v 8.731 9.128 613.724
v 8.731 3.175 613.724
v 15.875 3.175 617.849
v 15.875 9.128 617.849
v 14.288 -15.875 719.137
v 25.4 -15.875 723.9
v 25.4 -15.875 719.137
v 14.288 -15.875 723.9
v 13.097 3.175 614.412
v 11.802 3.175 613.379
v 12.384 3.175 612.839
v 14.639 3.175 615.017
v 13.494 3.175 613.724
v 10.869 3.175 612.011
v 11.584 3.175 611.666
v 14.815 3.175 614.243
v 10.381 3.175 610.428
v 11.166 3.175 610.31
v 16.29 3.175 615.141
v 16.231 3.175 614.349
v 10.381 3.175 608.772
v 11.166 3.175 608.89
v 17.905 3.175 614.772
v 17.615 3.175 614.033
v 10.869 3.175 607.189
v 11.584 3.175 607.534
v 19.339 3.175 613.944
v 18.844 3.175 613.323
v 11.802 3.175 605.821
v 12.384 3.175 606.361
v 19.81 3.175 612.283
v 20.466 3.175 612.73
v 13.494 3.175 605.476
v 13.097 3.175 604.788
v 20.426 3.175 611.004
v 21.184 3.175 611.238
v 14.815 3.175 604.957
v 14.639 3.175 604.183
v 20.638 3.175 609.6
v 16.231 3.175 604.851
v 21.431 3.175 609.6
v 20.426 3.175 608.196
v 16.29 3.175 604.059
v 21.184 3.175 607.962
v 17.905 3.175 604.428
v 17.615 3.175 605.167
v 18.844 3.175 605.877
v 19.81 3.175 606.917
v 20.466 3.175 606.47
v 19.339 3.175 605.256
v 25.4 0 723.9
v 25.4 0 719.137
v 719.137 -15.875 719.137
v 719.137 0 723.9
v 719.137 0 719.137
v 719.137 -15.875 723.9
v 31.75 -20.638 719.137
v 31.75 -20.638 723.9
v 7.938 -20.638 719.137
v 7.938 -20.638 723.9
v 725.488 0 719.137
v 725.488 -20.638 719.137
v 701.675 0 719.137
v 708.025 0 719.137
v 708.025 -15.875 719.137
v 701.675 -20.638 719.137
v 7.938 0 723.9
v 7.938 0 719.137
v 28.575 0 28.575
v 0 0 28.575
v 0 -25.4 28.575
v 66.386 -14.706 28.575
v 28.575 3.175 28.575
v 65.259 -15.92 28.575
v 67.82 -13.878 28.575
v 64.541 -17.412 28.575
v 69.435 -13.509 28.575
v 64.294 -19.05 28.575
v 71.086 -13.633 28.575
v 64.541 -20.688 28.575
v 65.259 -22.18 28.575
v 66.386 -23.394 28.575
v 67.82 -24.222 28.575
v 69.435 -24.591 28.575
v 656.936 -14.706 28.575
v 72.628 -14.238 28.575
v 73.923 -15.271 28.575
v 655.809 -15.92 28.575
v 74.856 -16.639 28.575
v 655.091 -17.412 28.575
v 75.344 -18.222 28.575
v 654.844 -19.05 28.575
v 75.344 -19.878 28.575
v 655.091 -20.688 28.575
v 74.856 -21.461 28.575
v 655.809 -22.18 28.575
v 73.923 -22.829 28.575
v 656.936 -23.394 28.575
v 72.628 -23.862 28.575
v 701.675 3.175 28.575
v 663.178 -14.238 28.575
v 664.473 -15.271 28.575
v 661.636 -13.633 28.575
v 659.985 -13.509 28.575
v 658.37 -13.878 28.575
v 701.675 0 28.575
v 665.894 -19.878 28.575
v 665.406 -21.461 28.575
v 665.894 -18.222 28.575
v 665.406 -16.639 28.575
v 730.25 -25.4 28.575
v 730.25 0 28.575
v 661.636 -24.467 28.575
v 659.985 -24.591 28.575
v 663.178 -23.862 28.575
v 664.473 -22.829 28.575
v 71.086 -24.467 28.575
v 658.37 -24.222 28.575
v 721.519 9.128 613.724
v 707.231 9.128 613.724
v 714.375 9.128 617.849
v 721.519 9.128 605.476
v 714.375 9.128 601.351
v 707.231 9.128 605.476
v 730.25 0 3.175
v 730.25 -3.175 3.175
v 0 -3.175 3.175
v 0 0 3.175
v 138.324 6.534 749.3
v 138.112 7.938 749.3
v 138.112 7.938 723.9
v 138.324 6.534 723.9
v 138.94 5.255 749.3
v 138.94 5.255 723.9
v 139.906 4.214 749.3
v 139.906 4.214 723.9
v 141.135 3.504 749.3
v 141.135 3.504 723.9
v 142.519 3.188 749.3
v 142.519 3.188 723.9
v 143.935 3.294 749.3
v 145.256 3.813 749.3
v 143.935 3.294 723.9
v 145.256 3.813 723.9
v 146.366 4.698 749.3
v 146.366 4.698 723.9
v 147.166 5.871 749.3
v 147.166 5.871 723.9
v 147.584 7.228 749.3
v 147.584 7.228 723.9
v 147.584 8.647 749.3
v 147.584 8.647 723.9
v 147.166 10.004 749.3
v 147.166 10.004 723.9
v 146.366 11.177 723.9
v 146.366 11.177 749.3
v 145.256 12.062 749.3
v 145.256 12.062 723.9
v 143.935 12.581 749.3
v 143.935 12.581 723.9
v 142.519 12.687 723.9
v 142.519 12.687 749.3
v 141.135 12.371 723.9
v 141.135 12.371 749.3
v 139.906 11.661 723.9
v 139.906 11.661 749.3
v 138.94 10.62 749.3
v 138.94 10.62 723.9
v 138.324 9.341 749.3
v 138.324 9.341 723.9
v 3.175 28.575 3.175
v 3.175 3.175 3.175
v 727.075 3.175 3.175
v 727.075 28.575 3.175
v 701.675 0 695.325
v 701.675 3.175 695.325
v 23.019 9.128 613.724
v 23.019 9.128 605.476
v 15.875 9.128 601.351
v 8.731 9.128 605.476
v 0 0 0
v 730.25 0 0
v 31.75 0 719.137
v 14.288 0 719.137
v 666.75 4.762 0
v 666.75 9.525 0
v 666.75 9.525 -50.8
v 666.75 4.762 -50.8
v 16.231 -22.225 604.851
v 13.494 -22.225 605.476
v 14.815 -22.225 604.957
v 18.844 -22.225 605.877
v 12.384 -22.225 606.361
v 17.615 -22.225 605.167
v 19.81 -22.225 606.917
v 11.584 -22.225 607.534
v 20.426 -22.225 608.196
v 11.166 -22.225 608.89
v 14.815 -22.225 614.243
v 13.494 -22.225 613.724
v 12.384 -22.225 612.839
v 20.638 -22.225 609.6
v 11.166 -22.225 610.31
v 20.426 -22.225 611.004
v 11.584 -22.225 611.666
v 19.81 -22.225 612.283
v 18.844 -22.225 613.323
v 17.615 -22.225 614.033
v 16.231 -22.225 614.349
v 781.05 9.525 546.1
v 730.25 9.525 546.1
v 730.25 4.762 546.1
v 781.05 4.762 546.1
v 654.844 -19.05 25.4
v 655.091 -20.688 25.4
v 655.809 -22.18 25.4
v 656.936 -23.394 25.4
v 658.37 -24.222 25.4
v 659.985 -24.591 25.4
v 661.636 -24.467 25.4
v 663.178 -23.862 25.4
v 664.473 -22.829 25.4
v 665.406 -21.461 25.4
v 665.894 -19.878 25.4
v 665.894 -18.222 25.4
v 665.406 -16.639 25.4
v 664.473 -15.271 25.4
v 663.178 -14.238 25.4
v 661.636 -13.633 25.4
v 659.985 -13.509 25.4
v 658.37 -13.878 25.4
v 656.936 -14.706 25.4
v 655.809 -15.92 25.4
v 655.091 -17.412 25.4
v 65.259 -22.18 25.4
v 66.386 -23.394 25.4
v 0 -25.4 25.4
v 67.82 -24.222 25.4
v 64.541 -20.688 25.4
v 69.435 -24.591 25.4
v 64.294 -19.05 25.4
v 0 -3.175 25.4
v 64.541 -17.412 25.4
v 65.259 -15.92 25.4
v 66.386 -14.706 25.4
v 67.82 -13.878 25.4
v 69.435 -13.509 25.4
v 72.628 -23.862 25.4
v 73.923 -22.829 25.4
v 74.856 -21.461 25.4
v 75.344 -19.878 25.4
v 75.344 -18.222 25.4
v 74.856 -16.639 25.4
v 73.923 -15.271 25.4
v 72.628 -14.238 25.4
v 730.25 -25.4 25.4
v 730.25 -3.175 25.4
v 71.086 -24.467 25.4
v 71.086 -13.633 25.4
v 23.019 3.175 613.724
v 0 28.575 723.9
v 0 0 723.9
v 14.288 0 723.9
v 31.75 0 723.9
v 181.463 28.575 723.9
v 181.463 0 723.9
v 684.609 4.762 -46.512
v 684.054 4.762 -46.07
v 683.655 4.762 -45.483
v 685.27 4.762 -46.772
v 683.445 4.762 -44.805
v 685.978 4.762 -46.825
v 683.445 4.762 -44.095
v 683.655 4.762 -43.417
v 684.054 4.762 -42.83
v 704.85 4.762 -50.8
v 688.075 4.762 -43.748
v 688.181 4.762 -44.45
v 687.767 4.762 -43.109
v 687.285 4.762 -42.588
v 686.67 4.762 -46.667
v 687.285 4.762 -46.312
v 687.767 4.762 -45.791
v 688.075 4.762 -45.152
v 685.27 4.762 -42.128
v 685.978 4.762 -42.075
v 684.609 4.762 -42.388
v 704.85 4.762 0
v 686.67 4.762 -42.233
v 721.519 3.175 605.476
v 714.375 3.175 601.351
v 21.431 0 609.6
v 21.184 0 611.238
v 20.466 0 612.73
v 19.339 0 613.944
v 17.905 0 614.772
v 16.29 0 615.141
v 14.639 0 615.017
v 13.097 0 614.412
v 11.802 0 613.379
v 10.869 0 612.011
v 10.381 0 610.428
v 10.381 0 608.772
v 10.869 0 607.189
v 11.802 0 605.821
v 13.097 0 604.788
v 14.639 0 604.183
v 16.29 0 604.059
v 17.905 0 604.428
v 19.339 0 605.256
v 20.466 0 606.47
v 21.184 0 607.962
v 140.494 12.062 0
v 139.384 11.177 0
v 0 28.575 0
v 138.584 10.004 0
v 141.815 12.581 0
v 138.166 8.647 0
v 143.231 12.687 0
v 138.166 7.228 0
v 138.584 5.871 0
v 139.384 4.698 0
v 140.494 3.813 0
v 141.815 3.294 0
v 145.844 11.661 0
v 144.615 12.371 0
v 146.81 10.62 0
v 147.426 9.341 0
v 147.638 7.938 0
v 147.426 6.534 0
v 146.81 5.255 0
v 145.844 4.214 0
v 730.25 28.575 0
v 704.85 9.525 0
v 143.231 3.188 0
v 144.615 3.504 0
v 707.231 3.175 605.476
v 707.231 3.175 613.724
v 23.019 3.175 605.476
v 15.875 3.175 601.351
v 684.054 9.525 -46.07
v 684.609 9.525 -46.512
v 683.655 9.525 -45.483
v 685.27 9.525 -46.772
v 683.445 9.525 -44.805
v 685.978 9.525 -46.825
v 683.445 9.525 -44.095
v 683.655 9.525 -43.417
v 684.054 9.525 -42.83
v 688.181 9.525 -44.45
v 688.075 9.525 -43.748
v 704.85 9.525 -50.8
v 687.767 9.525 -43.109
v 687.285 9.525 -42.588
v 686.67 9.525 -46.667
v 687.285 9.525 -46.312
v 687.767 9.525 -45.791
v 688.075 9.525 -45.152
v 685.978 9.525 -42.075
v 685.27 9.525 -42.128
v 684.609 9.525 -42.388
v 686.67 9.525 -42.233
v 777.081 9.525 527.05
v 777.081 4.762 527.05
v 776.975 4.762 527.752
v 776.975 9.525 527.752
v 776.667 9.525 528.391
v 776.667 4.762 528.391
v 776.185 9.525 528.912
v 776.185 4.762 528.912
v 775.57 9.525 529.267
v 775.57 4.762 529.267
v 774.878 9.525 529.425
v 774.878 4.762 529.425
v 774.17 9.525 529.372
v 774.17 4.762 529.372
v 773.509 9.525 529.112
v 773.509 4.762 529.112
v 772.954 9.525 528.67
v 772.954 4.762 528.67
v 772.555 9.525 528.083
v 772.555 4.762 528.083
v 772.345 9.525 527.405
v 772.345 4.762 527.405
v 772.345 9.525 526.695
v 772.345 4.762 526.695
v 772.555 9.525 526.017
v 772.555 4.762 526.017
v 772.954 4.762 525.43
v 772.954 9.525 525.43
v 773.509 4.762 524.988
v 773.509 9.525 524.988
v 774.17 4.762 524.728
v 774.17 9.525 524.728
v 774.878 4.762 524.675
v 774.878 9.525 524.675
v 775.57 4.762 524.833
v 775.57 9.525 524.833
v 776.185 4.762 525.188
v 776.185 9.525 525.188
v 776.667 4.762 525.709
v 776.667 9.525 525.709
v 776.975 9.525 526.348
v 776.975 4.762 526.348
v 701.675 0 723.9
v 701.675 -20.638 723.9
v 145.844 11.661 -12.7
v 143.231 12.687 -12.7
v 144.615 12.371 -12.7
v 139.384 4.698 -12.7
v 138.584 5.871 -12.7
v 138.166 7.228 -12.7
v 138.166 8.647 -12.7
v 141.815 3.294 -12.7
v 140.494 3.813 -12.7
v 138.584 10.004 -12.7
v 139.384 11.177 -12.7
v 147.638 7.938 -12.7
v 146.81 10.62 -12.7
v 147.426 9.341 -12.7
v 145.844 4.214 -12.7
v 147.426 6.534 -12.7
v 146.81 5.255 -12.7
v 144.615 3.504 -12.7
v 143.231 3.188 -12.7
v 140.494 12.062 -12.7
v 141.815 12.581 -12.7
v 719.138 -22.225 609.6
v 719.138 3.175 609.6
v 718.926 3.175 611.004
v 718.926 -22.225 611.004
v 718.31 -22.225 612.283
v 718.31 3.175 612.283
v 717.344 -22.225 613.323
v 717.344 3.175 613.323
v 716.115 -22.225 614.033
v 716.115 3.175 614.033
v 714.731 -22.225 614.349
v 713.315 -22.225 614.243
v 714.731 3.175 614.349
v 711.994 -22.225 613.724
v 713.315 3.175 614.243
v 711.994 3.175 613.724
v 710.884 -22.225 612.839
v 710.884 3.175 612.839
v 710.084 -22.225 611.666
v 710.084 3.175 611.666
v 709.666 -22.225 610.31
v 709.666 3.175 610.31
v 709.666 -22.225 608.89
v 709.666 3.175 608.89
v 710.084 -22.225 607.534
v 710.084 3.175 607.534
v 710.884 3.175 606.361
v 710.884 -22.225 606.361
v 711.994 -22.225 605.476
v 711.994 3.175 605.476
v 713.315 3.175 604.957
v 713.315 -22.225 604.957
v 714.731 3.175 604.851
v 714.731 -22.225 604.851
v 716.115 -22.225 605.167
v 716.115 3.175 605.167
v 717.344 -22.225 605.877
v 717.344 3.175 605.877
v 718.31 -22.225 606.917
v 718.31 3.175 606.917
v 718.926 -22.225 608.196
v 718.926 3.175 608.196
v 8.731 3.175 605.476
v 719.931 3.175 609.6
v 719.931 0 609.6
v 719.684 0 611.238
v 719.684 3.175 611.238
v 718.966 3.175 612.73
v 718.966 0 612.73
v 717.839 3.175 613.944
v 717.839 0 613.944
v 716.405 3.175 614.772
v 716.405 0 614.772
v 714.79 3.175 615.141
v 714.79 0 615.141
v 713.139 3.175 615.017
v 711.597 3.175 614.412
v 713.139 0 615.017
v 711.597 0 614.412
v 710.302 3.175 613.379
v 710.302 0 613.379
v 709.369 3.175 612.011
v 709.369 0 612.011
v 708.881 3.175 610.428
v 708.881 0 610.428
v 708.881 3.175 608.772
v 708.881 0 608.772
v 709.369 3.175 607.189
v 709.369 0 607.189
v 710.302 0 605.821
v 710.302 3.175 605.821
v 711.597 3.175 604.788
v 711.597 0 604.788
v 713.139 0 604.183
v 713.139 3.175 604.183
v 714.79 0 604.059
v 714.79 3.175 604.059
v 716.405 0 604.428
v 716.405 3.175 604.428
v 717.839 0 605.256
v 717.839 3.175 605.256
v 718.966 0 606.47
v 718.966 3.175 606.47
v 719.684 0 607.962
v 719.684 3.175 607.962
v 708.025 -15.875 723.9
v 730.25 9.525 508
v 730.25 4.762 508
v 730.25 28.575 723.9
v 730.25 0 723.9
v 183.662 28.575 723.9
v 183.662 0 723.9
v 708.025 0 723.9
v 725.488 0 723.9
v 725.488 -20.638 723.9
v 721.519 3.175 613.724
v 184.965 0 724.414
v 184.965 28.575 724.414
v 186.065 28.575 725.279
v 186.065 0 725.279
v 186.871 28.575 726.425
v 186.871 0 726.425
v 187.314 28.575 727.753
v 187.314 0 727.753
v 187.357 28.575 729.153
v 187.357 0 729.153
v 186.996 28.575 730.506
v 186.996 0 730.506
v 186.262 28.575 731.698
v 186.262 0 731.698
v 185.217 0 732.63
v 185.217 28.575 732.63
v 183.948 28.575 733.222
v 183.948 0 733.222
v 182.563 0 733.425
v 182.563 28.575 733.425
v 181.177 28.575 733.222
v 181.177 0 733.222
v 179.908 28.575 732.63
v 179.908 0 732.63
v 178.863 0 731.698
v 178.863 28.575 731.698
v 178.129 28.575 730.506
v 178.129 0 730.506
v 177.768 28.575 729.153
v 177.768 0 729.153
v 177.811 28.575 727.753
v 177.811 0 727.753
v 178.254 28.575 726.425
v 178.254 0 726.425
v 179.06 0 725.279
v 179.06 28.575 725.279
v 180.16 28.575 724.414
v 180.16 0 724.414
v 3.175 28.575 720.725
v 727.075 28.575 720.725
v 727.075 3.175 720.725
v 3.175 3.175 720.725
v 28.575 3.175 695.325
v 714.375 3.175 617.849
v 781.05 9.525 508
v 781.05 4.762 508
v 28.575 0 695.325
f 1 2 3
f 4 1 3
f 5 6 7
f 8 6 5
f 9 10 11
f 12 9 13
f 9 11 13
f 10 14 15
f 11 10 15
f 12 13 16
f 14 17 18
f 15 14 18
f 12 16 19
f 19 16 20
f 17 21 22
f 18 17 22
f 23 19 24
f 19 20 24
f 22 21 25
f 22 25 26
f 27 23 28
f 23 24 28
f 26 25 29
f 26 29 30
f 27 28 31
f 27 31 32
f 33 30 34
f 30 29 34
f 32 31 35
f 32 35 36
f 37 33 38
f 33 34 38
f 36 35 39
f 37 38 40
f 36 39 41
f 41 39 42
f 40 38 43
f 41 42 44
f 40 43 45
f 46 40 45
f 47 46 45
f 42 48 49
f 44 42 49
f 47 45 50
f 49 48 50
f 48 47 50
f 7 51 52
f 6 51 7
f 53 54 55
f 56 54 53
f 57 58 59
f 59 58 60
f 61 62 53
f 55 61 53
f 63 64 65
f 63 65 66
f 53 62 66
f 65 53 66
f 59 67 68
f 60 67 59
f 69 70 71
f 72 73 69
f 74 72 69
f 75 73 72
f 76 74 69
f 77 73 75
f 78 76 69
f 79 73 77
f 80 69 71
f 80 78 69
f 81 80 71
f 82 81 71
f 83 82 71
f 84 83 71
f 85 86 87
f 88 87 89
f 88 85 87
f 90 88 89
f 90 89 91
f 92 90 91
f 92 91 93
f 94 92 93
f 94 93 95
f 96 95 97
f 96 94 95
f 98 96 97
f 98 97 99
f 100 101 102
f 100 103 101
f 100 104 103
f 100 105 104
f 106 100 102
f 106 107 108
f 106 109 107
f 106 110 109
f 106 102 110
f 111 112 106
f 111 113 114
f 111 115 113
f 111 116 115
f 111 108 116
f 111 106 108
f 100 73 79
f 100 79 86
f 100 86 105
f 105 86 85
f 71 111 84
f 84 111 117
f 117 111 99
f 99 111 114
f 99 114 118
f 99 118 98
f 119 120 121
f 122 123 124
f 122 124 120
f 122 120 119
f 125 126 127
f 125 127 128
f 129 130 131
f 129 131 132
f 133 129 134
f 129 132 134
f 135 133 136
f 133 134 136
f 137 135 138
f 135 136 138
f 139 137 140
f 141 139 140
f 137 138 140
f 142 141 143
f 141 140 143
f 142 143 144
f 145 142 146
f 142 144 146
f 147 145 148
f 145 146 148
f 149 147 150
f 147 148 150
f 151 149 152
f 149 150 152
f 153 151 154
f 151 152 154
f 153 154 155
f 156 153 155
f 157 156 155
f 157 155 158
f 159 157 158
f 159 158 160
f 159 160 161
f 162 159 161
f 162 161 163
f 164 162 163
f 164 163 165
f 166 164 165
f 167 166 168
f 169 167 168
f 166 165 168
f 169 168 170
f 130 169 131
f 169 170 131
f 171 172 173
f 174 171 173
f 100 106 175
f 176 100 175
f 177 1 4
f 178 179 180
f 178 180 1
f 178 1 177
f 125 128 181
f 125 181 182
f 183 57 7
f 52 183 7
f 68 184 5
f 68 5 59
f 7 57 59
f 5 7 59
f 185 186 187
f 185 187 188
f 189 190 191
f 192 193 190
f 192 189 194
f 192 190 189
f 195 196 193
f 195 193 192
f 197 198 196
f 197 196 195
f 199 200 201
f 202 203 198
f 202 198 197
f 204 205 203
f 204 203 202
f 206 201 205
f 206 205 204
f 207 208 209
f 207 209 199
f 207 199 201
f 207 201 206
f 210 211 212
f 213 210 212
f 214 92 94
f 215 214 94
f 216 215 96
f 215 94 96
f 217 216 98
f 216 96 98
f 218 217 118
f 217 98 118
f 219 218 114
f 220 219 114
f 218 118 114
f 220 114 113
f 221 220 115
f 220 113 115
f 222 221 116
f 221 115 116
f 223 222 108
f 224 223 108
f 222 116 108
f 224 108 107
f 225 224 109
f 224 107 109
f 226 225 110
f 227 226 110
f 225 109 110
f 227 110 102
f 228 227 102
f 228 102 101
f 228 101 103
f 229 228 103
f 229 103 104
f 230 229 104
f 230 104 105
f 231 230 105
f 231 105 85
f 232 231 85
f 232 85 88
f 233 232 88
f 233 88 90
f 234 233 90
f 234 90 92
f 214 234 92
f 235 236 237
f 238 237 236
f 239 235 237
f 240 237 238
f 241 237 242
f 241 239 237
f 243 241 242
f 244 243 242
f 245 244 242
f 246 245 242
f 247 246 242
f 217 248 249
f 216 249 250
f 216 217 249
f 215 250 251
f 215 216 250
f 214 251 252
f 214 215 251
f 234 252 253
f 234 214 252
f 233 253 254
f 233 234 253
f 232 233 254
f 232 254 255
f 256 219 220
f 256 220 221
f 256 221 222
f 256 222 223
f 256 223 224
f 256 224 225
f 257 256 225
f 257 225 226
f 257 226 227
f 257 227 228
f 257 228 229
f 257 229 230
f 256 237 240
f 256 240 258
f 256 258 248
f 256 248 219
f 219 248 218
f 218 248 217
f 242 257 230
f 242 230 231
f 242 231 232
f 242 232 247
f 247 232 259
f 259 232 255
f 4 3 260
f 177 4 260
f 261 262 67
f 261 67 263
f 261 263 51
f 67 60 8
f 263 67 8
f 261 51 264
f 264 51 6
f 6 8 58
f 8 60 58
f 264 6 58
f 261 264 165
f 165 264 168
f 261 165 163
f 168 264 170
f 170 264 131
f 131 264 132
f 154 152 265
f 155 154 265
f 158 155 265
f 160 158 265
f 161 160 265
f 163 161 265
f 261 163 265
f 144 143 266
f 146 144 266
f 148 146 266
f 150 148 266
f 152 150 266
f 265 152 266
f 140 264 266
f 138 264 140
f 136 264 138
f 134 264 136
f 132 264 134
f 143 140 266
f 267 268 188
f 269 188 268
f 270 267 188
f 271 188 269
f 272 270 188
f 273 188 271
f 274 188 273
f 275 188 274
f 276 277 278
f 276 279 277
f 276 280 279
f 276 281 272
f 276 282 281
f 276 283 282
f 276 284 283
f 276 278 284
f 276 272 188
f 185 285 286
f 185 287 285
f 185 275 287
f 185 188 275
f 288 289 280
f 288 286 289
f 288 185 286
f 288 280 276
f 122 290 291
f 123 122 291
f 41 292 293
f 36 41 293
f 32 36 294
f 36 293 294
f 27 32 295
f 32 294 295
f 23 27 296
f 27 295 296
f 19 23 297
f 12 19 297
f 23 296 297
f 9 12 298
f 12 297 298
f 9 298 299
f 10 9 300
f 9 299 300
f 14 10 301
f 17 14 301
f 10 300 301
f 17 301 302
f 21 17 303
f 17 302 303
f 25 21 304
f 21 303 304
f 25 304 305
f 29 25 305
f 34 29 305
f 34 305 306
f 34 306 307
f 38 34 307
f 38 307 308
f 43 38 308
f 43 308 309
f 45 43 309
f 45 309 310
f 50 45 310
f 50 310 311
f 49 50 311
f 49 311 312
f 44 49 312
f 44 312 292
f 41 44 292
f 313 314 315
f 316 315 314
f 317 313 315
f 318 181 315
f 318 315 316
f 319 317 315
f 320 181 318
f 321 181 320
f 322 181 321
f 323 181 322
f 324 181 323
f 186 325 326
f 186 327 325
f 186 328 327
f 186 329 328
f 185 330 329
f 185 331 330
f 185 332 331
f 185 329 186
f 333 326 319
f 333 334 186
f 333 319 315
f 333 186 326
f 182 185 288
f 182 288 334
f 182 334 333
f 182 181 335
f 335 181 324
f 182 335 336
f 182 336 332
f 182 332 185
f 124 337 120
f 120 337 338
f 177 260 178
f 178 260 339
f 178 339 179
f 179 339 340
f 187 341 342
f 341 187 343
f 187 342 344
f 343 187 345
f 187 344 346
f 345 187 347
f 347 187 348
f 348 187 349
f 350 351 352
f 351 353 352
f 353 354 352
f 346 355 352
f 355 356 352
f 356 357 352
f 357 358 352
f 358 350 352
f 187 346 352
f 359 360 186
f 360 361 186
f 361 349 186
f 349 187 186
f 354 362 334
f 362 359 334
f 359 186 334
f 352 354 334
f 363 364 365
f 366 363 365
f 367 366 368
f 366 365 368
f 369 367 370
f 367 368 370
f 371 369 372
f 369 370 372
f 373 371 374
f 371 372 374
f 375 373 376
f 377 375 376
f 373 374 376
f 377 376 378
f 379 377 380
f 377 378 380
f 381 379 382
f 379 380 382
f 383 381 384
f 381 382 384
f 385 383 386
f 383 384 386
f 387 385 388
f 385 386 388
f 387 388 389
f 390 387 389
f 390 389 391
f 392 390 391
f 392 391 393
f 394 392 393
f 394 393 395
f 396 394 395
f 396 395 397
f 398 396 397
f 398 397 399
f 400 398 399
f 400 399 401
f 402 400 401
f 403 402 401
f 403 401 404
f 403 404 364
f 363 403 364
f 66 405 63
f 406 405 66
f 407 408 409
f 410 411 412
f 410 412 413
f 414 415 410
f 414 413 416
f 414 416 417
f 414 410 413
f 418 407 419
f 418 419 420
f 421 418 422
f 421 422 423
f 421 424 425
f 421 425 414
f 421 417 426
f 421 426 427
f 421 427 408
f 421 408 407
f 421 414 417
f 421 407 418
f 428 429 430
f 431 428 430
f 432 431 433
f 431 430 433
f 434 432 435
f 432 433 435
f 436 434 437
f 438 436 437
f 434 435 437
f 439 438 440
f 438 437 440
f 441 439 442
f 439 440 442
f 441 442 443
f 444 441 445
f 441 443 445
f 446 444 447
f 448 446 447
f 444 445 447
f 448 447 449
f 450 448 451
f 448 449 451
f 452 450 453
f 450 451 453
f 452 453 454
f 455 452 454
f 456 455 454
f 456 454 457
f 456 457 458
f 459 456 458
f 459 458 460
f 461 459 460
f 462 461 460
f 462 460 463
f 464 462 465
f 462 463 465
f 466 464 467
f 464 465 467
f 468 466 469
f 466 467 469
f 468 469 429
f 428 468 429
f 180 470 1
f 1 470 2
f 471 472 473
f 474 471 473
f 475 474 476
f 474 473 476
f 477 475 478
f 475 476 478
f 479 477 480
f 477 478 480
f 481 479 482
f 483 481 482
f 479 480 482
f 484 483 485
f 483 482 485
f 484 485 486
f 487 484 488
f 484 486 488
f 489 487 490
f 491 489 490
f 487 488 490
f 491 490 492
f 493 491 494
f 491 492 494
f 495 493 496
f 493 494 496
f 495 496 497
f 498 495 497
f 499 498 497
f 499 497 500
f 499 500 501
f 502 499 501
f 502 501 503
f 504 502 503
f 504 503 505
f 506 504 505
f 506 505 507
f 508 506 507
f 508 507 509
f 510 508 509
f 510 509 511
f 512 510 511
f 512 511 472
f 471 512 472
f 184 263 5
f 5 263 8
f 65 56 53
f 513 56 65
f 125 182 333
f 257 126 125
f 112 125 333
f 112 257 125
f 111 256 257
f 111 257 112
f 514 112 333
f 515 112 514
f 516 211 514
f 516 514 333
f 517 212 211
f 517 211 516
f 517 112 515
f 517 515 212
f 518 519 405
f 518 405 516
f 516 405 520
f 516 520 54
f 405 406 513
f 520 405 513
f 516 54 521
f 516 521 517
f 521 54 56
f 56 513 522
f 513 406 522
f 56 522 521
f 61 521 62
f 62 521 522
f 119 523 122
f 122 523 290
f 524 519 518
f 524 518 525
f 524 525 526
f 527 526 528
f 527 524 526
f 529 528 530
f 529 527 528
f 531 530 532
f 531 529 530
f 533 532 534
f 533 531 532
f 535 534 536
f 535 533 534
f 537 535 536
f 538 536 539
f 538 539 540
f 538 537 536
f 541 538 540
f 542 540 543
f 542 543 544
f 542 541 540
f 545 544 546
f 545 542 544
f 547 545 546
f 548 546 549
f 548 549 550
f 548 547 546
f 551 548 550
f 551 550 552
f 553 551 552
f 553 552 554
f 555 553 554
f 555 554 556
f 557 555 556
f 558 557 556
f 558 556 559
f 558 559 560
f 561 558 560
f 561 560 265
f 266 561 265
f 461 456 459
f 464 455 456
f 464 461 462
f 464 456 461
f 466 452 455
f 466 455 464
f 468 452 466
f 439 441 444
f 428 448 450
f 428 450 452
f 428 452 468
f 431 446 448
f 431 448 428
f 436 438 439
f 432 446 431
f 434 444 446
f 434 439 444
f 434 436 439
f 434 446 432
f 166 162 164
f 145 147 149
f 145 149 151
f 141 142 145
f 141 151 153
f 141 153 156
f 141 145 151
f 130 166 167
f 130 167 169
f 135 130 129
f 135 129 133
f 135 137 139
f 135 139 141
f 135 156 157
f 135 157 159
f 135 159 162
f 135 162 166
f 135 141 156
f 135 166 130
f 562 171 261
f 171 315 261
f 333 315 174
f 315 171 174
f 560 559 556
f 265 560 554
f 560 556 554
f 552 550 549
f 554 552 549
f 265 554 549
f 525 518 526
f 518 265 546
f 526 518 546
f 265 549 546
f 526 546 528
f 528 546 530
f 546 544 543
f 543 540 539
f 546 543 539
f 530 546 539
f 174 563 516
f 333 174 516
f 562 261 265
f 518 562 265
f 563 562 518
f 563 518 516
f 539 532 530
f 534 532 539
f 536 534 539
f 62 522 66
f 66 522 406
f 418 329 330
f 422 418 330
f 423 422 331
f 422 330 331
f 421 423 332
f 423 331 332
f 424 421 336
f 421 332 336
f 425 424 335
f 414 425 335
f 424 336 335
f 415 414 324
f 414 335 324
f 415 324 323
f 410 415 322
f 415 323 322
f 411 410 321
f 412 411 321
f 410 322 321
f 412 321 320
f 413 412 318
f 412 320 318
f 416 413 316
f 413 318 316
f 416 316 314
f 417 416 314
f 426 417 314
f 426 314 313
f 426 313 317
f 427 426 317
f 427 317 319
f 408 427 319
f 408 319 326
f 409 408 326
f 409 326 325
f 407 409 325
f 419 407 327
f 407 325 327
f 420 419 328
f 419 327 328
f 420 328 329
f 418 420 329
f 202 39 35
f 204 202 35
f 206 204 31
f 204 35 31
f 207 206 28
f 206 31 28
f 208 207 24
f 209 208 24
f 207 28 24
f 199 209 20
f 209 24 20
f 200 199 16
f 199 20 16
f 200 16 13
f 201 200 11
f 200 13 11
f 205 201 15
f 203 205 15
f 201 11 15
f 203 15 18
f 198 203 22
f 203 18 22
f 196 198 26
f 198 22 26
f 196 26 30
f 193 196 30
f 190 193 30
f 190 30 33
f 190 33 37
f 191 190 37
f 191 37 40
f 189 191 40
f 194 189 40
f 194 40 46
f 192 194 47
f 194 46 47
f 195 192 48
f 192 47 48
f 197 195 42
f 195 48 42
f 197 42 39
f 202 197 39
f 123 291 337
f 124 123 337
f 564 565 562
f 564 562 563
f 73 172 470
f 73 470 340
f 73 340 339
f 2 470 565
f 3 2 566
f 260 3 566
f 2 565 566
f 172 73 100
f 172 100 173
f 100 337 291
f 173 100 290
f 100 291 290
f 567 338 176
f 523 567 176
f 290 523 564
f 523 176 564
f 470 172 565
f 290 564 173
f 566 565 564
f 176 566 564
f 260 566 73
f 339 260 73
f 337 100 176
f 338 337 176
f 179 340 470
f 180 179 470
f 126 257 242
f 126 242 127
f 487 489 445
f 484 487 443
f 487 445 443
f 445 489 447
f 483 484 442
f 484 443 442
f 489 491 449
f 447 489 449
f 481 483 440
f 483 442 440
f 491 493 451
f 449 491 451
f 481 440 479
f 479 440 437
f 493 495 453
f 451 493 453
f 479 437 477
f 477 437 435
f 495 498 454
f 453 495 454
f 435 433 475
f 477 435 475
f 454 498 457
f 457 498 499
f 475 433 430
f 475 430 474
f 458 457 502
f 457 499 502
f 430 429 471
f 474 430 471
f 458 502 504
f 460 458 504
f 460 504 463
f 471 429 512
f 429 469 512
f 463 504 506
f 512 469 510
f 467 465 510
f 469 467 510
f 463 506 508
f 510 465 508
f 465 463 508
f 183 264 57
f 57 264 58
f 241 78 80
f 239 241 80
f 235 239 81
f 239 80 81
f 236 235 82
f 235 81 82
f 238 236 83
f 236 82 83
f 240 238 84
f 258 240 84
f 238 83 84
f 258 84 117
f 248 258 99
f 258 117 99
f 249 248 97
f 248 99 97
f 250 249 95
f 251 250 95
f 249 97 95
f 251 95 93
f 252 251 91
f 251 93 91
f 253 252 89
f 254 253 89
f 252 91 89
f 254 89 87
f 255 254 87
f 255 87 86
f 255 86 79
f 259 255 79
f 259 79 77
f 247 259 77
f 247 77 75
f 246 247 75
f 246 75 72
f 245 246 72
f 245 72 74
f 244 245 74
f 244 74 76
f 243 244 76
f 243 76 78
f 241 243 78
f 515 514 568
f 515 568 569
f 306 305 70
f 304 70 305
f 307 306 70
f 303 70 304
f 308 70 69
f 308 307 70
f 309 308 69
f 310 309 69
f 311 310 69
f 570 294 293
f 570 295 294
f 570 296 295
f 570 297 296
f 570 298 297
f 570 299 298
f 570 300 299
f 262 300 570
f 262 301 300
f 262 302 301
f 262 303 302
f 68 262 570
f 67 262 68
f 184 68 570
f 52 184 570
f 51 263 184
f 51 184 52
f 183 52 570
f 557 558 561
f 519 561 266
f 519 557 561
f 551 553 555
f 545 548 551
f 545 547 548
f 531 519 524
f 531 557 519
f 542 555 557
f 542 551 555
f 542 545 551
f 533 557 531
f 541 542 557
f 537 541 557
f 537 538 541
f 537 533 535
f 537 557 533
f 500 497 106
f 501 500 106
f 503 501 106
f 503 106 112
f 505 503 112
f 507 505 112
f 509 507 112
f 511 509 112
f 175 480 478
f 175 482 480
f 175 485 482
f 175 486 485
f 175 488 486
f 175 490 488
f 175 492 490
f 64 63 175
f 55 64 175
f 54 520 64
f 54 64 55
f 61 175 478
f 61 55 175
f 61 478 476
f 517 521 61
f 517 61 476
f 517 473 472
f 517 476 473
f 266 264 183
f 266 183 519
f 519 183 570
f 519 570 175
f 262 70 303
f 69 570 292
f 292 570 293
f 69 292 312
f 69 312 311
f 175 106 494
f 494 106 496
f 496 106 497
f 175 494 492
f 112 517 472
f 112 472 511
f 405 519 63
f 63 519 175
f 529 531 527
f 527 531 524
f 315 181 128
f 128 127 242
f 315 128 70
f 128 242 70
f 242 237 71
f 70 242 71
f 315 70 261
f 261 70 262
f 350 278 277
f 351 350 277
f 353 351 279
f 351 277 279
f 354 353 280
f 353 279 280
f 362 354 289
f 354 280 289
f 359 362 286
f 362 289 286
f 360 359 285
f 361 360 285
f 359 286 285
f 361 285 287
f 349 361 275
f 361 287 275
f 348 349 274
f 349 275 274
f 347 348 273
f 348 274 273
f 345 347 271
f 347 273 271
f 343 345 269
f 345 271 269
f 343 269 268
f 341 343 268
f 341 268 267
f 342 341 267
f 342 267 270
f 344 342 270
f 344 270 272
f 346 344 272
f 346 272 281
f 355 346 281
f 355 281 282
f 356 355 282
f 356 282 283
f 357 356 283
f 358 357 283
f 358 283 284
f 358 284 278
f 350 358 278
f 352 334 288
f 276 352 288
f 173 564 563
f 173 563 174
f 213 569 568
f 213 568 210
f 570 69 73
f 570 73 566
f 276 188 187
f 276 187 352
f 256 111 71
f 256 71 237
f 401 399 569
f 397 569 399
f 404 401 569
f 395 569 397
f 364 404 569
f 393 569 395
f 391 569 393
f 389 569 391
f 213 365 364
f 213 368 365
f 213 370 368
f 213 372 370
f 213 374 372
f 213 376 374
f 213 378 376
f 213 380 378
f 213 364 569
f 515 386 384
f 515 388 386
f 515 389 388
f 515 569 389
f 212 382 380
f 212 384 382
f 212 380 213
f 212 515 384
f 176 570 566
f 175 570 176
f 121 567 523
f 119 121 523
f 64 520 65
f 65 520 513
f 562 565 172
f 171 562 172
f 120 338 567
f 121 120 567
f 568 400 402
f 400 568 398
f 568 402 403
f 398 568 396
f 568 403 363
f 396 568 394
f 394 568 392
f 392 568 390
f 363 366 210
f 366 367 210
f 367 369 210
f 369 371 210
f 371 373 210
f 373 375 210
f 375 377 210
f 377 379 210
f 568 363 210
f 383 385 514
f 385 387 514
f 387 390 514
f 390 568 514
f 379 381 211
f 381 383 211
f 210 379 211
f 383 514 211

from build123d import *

# Parameters (mm, degrees)
SKETCH_W        = 730.25
SKETCH_H        = 723.9
SKETCH_W_2      = 673.1
SKETCH_H_2      = 666.75
PAD_DEPTH       = 3.175
SKETCH001_W     = 730.25
SKETCH001_H     = 723.9
SKETCH001_W_2   = 723.9
SKETCH001_H_2   = 717.55
PAD001_DEPTH    = 25.4
PAD002_DEPTH    = 730.25
SKETCH003_R     = 5.55625
POCKET_DEPTH    = 28.576
SKETCH004_W     = 23.8125
SKETCH004_H     = 23.8125
SKETCH004_W_2   = 11.1125
SKETCH004_H_2   = 15.875
PAD003_DEPTH    = 4.7625
SKETCH005_R     = 4.7625
PAD004_DEPTH    = 25.4
SKETCH006_R     = 4.7625
PAD005_DEPTH    = 12.7
SKETCH007_R     = 4.826
PAD006_DEPTH    = 28.575
SKETCH008_R     = 5.55625
POCKET001_DEPTH = 28.576
PAD007_DEPTH    = 5.953125
SKETCH010_R     = 4.7625
PAD008_DEPTH    = 25.4
SKETCH011_W     = 38.1
SKETCH011_H     = 4.7625
PAD009_DEPTH    = 50.8
SKETCH012_W     = 38.1
SKETCH012_H     = 4.7625
PAD010_DEPTH    = 50.8
SKETCH013_R     = 2.38125
POCKET002_DEPTH = 28.576


with BuildPart() as part:
    # Sketch → Pad (new body)
    with BuildSketch(Plane.XZ):
        with Locations((365.125, 361.95)):
            Rectangle(SKETCH_W, SKETCH_H)
        with Locations((365.125, 361.95)):
            Rectangle(SKETCH_W_2, SKETCH_H_2, mode=Mode.SUBTRACT)
    extrude(amount=-PAD_DEPTH)

    # Sketch001 (on Face10 of Pad) → Pad001 (join)
    with BuildSketch(Plane(origin=(0, 3.175, 0), x_dir=(1, 0, 0), z_dir=(0, 1, 0))):
        with Locations((365.125, -361.95)):
            Rectangle(SKETCH001_W, SKETCH001_H)
        with Locations((365.125, -361.95)):
            Rectangle(SKETCH001_W_2, SKETCH001_H_2, mode=Mode.SUBTRACT)
    extrude(amount=PAD001_DEPTH)

    # Sketch002 (on Face3 of Pad001) → Pad002 (join)
    with BuildSketch(Plane(origin=(730.25, 0, 0), x_dir=(0, 0, 1), z_dir=(1, 0, 0))):
        Polygon((3.175, 0), (28.575, 0), (28.575, 25.4), (25.4, 25.4), (25.4, 3.175), (3.175, 3.175), align=None)
    extrude(amount=-PAD002_DEPTH)

    # Sketch003 (on Face15 of Pad002) → Pocket (cut, through all)
    with BuildSketch(Plane(origin=(0, 0, 28.575), x_dir=(-1, 0, 0), z_dir=(0, 0, 1))):
        with Locations((-660.4, 19.05)):
            Circle(SKETCH003_R)
        with Locations((-69.85, 19.05)):
            Circle(SKETCH003_R)
    extrude(amount=-POCKET_DEPTH, mode=Mode.SUBTRACT)

    # Sketch004 (on Face6 of Pocket) → Pad003 (join)
    with BuildSketch(Plane(origin=(0, 0, 723.9), x_dir=(-1, 0, 0), z_dir=(0, 0, 1))):
        with Locations((-713.58125, 8.73125)):
            Rectangle(SKETCH004_W, SKETCH004_H)
        with Locations((-713.58125, 7.9375)):
            Rectangle(SKETCH004_W_2, SKETCH004_H_2, mode=Mode.SUBTRACT)
        with Locations((-19.84375, 8.73125)):
            Rectangle(SKETCH004_W, SKETCH004_H)
        with Locations((-19.84375, 7.9375)):
            Rectangle(SKETCH004_W_2, SKETCH004_H_2, mode=Mode.SUBTRACT)
    extrude(amount=-PAD003_DEPTH)

    # Sketch005 (on Face16 of Pad003) → Pad004 (join)
    with BuildSketch(Plane(origin=(0, 0, 723.9), x_dir=(-1, 0, 0), z_dir=(0, 0, 1))):
        with Locations((-142.875, -7.9375)):
            Circle(SKETCH005_R)
    extrude(amount=PAD004_DEPTH)

    # Sketch006 (on Face5 of Pad004) → Pad005 (join)
    with BuildSketch(Plane(origin=(0, 0, 0), x_dir=(1, 0, 0), z_dir=(0, 0, -1))):
        with Locations((142.875, -7.9375)):
            Circle(SKETCH006_R)
    extrude(amount=PAD005_DEPTH)

    # Sketch007 (on Face7 of Pad005) → Pad006 (join)
    with BuildSketch(Plane.XZ):
        with Locations((182.5625, 728.599)):
            Circle(SKETCH007_R)
    extrude(amount=-PAD006_DEPTH)

    # Sketch008 (on Face7 of Pad006) → Pocket001 (cut, through all)
    with BuildSketch(Plane.XZ):
        with Locations((15.875, 609.6)):
            Circle(SKETCH008_R)
        with Locations((714.375, 609.6)):
            Circle(SKETCH008_R)
    extrude(amount=-POCKET001_DEPTH, mode=Mode.SUBTRACT)

    # Sketch009 (on Face49 of Pocket001) → Pad007 (join)
    with BuildSketch(Plane(origin=(0, 3.175, 0), x_dir=(1, 0, 0), z_dir=(0, 1, 0))):
        Polygon((23.01875, -605.475554), (15.875, -601.351108), (8.73125, -605.475554), (8.73125, -613.724446), (15.875, -617.848892), (23.01875, -613.724446), align=None)
        Polygon((714.375, -601.351108), (707.23125, -605.475554), (707.23125, -613.724446), (714.375, -617.848892), (721.51875, -613.724446), (721.51875, -605.475554), align=None)
    extrude(amount=PAD007_DEPTH)

    # Sketch010 (on Face64 of Pad007) → Pad008 (join)
    with BuildSketch(Plane.XZ.offset(-3.175)):
        with Locations((15.875, 609.6)):
            Circle(SKETCH010_R)
        with Locations((714.375, 609.6)):
            Circle(SKETCH010_R)
    extrude(amount=PAD008_DEPTH)

    # Sketch011 (on Face12 of Pad008) → Pad009 (join)
    with BuildSketch(Plane(origin=(730.25, 0, 0), x_dir=(0, 0, 1), z_dir=(1, 0, 0))):
        with Locations((527.05, -7.14375)):
            Rectangle(SKETCH011_W, SKETCH011_H)
    extrude(amount=PAD009_DEPTH)

    # Sketch012 (on Face5 of Pad009) → Pad010 (join)
    with BuildSketch(Plane(origin=(0, 0, 0), x_dir=(1, 0, 0), z_dir=(0, 0, -1))):
        with Locations((685.8, -7.14375)):
            Rectangle(SKETCH012_W, SKETCH012_H)
    extrude(amount=PAD010_DEPTH)

    # Sketch013 (on Face7 of Pad010) → Pocket002 (cut, through all)
    with BuildSketch(Plane.XZ):
        with Locations((774.7, 527.05)):
            Circle(SKETCH013_R)
        with Locations((685.8, -44.45)):
            Circle(SKETCH013_R)
    extrude(amount=-POCKET002_DEPTH, mode=Mode.SUBTRACT)


solid = part.part
